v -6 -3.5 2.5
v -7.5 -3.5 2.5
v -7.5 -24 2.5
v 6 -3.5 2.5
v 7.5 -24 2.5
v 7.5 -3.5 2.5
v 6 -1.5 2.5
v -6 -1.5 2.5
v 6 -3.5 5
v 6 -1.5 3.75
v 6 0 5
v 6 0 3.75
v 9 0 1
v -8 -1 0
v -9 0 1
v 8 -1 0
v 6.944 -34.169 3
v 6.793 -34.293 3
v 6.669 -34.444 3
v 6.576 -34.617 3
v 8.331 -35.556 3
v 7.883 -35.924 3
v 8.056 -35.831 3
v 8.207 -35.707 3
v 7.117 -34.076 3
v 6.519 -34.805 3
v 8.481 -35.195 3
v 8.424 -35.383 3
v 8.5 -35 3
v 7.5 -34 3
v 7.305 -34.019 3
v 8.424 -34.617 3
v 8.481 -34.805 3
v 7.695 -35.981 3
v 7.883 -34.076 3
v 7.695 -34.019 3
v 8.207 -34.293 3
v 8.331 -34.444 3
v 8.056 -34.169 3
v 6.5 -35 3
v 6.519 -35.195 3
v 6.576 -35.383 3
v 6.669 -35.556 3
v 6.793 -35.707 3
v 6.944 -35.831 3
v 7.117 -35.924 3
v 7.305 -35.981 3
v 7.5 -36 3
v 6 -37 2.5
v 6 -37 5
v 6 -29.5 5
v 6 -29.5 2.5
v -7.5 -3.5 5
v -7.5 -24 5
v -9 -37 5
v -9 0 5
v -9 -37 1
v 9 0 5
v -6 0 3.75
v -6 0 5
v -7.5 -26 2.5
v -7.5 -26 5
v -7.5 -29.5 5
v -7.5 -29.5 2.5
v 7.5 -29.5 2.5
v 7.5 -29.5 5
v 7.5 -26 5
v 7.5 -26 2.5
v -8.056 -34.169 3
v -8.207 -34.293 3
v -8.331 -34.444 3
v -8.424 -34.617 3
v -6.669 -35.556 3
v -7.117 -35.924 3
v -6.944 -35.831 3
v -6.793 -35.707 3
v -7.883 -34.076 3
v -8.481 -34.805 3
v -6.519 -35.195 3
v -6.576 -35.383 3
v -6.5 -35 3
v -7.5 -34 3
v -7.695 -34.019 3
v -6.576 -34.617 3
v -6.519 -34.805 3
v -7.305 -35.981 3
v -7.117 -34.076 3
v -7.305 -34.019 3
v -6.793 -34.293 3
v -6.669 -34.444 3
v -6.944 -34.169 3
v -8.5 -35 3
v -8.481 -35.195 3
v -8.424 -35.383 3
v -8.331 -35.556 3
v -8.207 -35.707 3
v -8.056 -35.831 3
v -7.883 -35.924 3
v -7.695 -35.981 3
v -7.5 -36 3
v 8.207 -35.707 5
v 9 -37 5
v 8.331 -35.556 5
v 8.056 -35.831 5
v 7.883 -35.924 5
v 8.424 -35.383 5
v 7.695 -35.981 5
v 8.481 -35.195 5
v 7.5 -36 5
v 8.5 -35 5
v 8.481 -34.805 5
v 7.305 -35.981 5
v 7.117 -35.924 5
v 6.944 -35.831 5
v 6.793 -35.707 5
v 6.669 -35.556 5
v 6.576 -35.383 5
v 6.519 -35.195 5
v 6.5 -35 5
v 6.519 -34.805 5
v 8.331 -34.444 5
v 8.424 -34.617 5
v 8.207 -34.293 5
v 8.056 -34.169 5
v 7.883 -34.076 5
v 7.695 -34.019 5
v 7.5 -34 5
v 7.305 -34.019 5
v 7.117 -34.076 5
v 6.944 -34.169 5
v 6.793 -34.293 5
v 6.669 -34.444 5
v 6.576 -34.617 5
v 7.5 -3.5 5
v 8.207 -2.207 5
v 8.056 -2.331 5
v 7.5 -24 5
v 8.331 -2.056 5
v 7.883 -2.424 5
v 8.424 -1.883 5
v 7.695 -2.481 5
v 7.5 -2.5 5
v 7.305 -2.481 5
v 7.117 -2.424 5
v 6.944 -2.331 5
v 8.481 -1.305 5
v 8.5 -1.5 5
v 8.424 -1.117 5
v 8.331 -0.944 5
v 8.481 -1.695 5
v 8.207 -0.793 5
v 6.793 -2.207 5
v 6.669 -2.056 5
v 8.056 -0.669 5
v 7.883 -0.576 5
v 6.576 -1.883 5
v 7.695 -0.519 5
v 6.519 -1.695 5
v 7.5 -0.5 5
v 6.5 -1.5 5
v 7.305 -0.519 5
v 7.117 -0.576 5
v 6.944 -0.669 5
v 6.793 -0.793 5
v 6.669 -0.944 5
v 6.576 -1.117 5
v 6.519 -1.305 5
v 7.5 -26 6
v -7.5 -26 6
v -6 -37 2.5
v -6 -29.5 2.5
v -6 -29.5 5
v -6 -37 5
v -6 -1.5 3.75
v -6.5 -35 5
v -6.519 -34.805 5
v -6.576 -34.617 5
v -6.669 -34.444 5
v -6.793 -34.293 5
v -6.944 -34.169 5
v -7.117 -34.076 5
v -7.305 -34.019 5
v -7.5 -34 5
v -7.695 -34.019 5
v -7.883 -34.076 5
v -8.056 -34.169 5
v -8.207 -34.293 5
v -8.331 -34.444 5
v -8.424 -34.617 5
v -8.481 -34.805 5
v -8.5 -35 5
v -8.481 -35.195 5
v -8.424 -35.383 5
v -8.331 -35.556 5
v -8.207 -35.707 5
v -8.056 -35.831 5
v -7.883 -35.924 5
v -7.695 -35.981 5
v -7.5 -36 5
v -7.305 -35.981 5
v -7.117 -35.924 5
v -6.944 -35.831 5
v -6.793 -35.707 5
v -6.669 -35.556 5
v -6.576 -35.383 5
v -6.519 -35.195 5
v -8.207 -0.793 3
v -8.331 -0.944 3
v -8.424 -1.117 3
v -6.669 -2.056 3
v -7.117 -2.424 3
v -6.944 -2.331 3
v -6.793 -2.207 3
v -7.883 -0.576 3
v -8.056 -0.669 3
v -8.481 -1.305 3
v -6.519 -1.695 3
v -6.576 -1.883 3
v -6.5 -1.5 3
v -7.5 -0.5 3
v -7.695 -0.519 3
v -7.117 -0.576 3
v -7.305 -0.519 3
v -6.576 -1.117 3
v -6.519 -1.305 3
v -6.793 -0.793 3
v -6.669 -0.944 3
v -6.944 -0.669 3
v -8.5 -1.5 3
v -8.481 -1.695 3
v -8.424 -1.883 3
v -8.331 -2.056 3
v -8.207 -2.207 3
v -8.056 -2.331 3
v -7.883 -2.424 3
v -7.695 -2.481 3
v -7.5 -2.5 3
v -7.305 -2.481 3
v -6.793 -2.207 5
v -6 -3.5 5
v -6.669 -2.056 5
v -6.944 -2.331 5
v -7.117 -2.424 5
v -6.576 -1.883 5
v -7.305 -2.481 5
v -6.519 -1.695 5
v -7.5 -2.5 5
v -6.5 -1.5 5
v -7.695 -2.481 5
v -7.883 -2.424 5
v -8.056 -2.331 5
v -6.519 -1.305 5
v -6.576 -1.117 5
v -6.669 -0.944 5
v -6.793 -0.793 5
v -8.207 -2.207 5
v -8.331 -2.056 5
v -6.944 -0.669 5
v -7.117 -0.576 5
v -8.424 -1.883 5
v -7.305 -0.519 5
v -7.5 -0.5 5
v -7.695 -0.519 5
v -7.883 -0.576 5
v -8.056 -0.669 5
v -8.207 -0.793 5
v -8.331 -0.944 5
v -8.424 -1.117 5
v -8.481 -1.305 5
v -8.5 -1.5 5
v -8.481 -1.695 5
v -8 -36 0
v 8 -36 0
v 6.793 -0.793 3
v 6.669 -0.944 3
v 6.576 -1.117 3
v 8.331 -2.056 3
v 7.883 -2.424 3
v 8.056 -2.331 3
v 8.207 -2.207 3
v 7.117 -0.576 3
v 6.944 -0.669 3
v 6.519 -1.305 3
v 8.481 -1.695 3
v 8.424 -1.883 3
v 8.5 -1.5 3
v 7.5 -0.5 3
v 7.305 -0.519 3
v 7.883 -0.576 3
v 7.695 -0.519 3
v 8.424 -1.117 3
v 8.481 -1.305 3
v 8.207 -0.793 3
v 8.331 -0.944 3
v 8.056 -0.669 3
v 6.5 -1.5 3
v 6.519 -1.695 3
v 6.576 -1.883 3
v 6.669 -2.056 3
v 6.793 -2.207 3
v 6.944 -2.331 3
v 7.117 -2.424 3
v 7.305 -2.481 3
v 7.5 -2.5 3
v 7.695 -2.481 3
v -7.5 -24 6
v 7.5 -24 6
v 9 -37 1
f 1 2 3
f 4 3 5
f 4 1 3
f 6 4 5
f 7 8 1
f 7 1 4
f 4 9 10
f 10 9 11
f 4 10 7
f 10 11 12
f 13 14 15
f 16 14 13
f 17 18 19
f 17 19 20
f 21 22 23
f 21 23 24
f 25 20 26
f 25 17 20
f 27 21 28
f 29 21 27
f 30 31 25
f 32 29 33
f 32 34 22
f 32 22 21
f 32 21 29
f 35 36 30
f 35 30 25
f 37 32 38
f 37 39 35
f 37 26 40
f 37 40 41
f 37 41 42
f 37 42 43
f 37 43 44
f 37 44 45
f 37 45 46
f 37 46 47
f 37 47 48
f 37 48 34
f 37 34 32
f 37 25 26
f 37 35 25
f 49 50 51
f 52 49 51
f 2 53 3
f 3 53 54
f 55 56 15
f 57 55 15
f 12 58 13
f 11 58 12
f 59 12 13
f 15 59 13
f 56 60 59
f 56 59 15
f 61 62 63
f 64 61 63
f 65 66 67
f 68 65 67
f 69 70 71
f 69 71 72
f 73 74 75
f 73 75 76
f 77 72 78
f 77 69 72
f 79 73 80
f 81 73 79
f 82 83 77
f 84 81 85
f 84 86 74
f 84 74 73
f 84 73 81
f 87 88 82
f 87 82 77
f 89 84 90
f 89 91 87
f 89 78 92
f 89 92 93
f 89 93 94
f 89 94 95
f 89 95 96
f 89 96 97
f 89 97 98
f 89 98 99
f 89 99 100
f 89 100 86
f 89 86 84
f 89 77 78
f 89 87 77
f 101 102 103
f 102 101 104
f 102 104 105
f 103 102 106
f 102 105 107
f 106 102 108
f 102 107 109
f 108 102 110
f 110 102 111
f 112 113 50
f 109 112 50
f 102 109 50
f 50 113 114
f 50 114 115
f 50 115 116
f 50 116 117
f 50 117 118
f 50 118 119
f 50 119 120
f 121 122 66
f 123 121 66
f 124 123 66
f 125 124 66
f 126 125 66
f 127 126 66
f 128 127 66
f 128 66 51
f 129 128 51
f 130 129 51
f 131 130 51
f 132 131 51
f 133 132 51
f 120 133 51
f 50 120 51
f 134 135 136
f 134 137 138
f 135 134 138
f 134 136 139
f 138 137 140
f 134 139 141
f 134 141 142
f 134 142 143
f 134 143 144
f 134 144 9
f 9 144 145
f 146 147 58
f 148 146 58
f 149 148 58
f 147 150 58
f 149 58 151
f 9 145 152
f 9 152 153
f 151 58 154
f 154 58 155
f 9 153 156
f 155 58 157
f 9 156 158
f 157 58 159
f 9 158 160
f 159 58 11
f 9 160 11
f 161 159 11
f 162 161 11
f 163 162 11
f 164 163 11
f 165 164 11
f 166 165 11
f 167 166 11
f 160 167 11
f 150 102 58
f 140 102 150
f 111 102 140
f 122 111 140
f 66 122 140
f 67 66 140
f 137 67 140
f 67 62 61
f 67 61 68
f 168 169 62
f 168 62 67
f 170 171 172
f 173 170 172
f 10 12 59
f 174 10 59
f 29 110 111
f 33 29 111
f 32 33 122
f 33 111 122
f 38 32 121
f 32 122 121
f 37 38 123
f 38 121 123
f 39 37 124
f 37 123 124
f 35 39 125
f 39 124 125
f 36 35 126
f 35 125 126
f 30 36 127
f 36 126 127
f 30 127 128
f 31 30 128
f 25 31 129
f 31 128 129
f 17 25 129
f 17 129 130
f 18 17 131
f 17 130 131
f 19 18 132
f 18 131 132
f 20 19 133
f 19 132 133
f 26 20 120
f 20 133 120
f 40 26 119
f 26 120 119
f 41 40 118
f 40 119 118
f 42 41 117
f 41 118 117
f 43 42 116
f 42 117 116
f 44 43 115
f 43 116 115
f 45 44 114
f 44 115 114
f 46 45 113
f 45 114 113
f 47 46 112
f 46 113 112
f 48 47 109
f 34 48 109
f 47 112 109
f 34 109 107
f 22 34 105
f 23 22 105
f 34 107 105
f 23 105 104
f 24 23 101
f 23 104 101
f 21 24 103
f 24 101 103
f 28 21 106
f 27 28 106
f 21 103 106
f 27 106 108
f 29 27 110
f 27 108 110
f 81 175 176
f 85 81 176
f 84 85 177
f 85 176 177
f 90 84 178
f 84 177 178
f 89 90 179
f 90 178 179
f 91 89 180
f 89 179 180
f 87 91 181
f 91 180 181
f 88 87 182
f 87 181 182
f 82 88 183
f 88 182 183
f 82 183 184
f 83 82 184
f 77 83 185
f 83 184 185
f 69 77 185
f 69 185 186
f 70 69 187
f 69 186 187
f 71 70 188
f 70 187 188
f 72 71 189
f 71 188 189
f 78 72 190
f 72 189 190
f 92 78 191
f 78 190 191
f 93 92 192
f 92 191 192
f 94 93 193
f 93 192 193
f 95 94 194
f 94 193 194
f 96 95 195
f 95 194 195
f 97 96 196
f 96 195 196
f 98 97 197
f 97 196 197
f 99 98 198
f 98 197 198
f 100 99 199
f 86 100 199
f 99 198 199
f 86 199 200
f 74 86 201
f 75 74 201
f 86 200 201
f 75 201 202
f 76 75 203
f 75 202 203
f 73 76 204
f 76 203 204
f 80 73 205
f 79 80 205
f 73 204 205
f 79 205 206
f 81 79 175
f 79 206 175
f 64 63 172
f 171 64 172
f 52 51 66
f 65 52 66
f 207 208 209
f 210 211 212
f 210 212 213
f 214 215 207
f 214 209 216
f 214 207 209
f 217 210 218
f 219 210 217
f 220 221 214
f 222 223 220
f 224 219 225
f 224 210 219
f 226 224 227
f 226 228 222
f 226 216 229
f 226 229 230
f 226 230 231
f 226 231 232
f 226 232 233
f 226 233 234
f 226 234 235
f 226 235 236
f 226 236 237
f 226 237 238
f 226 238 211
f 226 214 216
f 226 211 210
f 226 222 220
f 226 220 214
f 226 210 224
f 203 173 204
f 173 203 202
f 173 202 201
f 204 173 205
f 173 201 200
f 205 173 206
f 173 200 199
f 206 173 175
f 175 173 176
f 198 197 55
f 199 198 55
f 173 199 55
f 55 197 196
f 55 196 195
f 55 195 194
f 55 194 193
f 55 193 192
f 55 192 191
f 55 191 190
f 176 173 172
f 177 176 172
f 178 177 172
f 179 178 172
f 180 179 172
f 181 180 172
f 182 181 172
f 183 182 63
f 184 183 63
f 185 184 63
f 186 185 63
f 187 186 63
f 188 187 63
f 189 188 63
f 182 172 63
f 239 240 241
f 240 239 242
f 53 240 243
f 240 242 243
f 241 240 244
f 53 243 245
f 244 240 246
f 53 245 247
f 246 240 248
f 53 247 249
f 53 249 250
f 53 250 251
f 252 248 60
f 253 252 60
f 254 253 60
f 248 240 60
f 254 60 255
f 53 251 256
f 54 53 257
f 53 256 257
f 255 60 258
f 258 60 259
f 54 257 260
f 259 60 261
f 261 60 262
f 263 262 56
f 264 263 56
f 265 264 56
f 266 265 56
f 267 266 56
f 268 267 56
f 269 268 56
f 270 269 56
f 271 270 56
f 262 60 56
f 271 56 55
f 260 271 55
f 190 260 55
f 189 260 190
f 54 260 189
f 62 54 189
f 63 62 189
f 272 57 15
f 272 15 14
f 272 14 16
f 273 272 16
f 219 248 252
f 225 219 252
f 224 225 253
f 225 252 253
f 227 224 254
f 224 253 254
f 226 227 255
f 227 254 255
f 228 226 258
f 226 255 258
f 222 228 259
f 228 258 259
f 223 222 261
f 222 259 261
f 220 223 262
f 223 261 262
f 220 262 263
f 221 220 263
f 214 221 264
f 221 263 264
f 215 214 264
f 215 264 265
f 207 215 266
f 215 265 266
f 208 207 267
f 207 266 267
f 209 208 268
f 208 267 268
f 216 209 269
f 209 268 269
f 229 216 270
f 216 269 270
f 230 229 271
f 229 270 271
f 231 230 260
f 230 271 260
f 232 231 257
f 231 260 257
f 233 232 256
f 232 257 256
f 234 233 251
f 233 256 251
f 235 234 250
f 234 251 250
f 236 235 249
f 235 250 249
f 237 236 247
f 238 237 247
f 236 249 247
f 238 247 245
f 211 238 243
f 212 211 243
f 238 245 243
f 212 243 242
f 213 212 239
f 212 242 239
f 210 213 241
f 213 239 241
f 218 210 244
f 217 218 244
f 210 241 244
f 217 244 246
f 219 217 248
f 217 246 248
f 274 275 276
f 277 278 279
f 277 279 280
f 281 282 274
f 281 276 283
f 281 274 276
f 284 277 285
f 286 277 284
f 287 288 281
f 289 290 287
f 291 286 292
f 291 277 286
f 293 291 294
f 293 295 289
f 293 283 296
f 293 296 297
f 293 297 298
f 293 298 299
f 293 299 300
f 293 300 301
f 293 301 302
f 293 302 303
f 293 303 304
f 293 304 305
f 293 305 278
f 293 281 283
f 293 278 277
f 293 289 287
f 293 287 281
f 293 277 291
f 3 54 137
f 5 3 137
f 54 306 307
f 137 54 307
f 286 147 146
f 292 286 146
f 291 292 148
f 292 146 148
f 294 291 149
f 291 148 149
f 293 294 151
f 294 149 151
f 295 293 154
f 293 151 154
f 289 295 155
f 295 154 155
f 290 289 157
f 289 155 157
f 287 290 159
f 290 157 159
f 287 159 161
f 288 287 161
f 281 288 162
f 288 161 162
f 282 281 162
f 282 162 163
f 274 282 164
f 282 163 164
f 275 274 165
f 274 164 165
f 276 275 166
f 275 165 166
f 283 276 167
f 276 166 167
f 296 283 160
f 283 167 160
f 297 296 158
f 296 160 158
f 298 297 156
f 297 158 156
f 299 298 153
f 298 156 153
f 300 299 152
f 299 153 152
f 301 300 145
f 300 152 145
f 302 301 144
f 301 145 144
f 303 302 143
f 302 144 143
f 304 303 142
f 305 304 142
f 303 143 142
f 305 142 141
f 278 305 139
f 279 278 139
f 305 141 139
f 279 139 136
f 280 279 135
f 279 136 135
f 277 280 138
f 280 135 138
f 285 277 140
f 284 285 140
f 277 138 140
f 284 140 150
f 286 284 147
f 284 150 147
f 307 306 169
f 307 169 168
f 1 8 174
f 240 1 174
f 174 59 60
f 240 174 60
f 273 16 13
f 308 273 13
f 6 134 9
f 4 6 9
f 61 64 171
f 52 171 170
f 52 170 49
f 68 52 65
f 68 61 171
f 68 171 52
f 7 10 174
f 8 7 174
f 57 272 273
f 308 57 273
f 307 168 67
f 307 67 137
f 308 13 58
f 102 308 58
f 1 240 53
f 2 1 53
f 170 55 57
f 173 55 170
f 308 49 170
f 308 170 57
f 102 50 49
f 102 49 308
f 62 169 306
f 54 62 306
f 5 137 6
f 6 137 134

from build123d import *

# Parameters (mm, degrees)
F1_DEPTH  = 37
F2_W      = 12
F2_H      = 1.25
F3_DEPTH  = 2
F5_DEPTH  = 2.5
F7_W      = 15
F7_H      = 2
F8_DEPTH  = 3.5
F9_R      = 1
F9_R_2    = 0.9349601775
F10_DEPTH = 2
F11_SIZE  = 1


with BuildPart() as f1:
    # F0 (on Front) → F1 (new body)
    with BuildSketch(Plane.XZ):
        Polygon((-9, 1), (-8, 0), (8, 0), (9, 1), (9, 5), (6, 5), (6, 2.5), (-6, 2.5), (-6, 5), (-9, 5), align=None)
    extrude(amount=F1_DEPTH)

    # F2 (on face) → F3 (join)
    with BuildSketch(Plane(origin=(0, 0, 0), x_dir=(-1, 0, 0), z_dir=(0, 1, 0))):
        with Locations((0, 3.125)):
            Rectangle(F2_W, F2_H)
    extrude(amount=-F3_DEPTH)

    # F4 (on face) → F5 (cut, through all)
    with BuildSketch(Plane.XY.offset(5)):
        Polygon((-7.5, -3.5), (-7.5, -29.5), (-6, -29.5), (-6, -35.5), (6, -35.5), (6, -29.5), (7.5, -29.5), (7.5, -3.5), (6, -3.5), (6, -1.5), (-6, -1.5), (-6, -3.5), align=None)
    extrude(amount=-F5_DEPTH, mode=Mode.SUBTRACT)

    # F7 (on offset) → F8 (join, through all)
    with BuildSketch(Plane.XY.offset(6)):
        with Locations((0, -25)):
            Rectangle(F7_W, F7_H)
    extrude(amount=-F8_DEPTH)

    # F9 (on face) → F10 (cut)
    with BuildSketch(Plane.XY.offset(5)):
        with Locations((-7.5, -35)):
            Circle(F9_R)
        with Locations((134.6376875191, -34.7655261621)):
            Circle(F9_R_2)
        with Locations((7.5, -35)):
            Circle(F9_R)
        with Locations((-7.5, -1.5)):
            Circle(F9_R)
        with Locations((7.5, -1.5)):
            Circle(F9_R)
    extrude(amount=-F10_DEPTH, mode=Mode.SUBTRACT)

    # F11
    f11_edges = [f1.edges().sort_by_distance(p)[0] for p in [
        (0, 0, 0),
        (0, -37, 0),
    ]]
    chamfer(f11_edges, length=F11_SIZE)


solid = f1.part
